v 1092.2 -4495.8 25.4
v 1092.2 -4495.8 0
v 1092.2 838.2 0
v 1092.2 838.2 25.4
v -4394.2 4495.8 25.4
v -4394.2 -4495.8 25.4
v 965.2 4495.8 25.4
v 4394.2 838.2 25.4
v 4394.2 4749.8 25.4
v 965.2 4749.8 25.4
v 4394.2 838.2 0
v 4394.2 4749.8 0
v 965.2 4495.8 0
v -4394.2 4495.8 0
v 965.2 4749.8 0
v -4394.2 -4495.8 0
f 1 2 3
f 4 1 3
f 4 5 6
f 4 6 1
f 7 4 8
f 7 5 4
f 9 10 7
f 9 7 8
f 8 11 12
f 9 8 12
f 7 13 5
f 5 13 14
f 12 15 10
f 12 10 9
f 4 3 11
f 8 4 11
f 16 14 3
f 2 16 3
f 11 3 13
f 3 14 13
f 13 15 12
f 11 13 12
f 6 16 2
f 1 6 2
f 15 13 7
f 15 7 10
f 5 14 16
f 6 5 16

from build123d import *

# Parameters (mm, degrees)
F0_W     = 3429
F0_H     = 254
F1_DEPTH = 25.4


with BuildPart() as f1:
    # F0 (on Top) → F1 (new body)
    with BuildSketch(Plane.XY):
        with Locations((2679.7, 4622.8)):
            Rectangle(F0_W, F0_H)
        Polygon((965.2, 4495.8), (-4394.2, 4495.8), (-4394.2, -4495.8), (1092.2, -4495.8), (1092.2, 838.2), (4394.2, 838.2), (4394.2, 4495.8), align=None)
    extrude(amount=F1_DEPTH)


solid = f1.part
